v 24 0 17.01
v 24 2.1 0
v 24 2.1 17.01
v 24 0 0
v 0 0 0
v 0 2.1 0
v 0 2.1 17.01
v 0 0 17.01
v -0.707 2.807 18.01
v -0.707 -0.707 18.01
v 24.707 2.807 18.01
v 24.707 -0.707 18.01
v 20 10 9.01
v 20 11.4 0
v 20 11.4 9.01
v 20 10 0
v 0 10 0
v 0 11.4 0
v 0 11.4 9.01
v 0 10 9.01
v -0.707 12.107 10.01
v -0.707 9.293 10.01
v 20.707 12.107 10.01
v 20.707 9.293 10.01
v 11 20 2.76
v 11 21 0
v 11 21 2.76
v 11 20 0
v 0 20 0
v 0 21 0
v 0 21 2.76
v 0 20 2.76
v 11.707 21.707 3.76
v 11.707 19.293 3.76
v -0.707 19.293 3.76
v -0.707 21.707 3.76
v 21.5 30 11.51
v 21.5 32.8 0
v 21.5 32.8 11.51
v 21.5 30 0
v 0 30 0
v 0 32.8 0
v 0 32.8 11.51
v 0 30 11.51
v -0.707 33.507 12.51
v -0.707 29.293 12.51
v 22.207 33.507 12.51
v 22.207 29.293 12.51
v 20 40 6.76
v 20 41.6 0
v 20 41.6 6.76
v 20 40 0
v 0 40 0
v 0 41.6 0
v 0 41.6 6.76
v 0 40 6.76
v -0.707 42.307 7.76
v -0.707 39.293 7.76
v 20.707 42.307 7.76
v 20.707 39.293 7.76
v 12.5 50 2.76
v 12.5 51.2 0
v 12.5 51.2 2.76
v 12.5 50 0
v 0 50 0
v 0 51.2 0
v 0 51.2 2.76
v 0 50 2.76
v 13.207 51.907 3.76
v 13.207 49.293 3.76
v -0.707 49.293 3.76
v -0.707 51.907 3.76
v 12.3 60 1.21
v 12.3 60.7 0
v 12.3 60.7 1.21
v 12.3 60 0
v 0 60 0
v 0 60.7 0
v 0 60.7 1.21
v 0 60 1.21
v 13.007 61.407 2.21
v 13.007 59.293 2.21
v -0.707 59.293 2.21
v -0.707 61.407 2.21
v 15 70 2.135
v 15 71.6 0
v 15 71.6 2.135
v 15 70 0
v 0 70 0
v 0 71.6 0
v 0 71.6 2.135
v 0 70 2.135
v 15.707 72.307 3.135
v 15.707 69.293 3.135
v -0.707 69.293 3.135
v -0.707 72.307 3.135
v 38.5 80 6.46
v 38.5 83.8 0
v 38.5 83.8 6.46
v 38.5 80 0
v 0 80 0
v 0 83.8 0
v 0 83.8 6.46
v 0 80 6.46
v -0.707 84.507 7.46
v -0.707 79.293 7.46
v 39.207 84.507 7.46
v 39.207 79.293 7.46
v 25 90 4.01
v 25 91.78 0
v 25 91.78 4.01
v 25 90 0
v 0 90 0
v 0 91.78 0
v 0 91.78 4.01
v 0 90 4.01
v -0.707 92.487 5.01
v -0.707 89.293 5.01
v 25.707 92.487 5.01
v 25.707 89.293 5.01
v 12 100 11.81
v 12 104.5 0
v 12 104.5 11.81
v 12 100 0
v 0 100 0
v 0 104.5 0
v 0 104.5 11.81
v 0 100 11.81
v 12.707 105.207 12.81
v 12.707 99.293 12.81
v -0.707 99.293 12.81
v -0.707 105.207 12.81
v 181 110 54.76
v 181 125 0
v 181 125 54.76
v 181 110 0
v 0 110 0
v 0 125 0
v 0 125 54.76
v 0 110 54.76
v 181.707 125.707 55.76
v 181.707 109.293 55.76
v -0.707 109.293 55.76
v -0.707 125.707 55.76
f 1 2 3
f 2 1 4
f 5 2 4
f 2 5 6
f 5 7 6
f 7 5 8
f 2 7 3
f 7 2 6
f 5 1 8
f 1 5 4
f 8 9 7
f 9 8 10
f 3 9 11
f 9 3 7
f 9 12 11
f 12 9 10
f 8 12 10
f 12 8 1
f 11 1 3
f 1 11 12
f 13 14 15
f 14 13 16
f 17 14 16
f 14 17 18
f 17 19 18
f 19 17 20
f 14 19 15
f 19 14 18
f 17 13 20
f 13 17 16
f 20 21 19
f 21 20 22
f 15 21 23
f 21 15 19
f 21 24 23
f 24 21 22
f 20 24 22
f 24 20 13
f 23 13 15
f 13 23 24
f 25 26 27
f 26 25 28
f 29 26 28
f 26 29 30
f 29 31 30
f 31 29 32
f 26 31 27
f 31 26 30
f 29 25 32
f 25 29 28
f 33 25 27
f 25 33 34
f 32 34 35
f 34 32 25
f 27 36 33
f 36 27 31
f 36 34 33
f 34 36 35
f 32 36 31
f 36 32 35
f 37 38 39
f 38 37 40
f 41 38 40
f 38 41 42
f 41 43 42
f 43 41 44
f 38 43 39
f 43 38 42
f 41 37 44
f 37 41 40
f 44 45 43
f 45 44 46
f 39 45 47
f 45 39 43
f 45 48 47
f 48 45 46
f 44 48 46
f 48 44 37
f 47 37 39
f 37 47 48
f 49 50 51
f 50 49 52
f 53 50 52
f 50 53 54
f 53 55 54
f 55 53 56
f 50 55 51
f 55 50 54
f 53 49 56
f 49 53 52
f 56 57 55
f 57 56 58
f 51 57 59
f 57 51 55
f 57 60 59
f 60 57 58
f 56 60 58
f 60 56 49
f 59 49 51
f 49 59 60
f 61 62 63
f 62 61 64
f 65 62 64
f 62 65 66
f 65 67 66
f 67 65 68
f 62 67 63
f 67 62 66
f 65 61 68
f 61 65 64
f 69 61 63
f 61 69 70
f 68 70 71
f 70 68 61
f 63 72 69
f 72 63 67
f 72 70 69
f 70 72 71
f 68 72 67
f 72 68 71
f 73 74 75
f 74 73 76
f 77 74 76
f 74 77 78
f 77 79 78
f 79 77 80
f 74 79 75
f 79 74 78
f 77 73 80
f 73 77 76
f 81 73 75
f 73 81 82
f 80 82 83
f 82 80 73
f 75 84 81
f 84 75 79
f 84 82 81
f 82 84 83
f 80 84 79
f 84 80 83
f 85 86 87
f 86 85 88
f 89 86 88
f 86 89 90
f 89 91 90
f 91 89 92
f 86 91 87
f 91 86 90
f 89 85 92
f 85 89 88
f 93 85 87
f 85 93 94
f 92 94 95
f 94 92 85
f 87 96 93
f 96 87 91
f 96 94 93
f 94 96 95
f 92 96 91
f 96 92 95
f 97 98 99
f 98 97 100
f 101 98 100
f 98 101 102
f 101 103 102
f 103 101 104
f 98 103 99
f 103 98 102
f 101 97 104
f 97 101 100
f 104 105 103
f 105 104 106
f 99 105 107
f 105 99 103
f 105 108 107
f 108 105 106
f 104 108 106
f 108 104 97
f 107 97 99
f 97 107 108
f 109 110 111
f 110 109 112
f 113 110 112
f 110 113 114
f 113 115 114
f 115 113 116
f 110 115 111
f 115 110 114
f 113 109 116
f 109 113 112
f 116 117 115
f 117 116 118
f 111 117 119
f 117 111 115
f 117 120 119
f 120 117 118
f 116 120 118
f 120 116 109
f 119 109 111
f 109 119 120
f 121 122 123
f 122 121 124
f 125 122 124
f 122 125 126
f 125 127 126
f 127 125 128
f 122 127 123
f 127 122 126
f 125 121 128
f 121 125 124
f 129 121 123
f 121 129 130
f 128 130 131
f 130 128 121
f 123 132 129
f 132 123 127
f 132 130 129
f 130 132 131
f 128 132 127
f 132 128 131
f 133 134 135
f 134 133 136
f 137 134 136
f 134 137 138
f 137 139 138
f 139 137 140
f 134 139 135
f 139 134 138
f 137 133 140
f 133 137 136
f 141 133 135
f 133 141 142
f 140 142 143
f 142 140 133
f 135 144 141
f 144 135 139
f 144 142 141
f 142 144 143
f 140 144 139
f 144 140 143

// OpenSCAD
// Creates a slot with a small champer for easy insertertion
//#slotCutout(100,20,40);
//width = width of slot
//depth = depth of slot
//height = height of slot
//champer = champer size
fudgeFactor = 0.01;
module slotCutout(size, champer = 1.2)
{
  //TODO, this needs fixing, the champher math is off,
  //Needs to be a fixed champher not based no width
  champer = 1;
   c = size.y  + 0.5;
  translate([size.x/2,size.y/2,0])
  intersection(){
    union(){
      // Main slot
      translate([-size.x/2,-size.y/2,0])
        cube([size.x, size.y, size.z]);
      
     translate([-size.x/2,-size.y/2,size.z+fudgeFactor])
     hull(){
        translate([0,0,0])
          rotate([180,0,45])
          cylinder(champer,champer,00,$fn=4);
        translate([size.x,0,0])
        rotate([180,0,45])
          cylinder(champer,champer,00,$fn=4);
        translate([0,size.y,0])
        rotate([180,0,45])
          cylinder(champer,champer,00,$fn=4);
        translate([size.x,size.y,0])
        rotate([180,0,45])
          cylinder(champer,champer,00,$fn=4);          
          
     }
    }
  }
}

  sizes = [[24, 2.1, 18],
  [20, 1.4, 10],
  [11, 1, 3.75],
  [21.5, 2.8, 12.5],
  [20, 1.6, 7.75],
  [12.5, 1.2, 3.75],
  [12.3, 0.7, 2.2],
  [15, 1.6, 3.125],
  [38.5, 3.8, 7.45],
  [25, 1.78, 5],
  [12, 4.5, 12.8],
  [181, 15, 55.75]];

   for(i = [0:1:len(sizes)-1]){
   
   translate([0,10*i,0])
    slotCutout(sizes[i]);
   }
